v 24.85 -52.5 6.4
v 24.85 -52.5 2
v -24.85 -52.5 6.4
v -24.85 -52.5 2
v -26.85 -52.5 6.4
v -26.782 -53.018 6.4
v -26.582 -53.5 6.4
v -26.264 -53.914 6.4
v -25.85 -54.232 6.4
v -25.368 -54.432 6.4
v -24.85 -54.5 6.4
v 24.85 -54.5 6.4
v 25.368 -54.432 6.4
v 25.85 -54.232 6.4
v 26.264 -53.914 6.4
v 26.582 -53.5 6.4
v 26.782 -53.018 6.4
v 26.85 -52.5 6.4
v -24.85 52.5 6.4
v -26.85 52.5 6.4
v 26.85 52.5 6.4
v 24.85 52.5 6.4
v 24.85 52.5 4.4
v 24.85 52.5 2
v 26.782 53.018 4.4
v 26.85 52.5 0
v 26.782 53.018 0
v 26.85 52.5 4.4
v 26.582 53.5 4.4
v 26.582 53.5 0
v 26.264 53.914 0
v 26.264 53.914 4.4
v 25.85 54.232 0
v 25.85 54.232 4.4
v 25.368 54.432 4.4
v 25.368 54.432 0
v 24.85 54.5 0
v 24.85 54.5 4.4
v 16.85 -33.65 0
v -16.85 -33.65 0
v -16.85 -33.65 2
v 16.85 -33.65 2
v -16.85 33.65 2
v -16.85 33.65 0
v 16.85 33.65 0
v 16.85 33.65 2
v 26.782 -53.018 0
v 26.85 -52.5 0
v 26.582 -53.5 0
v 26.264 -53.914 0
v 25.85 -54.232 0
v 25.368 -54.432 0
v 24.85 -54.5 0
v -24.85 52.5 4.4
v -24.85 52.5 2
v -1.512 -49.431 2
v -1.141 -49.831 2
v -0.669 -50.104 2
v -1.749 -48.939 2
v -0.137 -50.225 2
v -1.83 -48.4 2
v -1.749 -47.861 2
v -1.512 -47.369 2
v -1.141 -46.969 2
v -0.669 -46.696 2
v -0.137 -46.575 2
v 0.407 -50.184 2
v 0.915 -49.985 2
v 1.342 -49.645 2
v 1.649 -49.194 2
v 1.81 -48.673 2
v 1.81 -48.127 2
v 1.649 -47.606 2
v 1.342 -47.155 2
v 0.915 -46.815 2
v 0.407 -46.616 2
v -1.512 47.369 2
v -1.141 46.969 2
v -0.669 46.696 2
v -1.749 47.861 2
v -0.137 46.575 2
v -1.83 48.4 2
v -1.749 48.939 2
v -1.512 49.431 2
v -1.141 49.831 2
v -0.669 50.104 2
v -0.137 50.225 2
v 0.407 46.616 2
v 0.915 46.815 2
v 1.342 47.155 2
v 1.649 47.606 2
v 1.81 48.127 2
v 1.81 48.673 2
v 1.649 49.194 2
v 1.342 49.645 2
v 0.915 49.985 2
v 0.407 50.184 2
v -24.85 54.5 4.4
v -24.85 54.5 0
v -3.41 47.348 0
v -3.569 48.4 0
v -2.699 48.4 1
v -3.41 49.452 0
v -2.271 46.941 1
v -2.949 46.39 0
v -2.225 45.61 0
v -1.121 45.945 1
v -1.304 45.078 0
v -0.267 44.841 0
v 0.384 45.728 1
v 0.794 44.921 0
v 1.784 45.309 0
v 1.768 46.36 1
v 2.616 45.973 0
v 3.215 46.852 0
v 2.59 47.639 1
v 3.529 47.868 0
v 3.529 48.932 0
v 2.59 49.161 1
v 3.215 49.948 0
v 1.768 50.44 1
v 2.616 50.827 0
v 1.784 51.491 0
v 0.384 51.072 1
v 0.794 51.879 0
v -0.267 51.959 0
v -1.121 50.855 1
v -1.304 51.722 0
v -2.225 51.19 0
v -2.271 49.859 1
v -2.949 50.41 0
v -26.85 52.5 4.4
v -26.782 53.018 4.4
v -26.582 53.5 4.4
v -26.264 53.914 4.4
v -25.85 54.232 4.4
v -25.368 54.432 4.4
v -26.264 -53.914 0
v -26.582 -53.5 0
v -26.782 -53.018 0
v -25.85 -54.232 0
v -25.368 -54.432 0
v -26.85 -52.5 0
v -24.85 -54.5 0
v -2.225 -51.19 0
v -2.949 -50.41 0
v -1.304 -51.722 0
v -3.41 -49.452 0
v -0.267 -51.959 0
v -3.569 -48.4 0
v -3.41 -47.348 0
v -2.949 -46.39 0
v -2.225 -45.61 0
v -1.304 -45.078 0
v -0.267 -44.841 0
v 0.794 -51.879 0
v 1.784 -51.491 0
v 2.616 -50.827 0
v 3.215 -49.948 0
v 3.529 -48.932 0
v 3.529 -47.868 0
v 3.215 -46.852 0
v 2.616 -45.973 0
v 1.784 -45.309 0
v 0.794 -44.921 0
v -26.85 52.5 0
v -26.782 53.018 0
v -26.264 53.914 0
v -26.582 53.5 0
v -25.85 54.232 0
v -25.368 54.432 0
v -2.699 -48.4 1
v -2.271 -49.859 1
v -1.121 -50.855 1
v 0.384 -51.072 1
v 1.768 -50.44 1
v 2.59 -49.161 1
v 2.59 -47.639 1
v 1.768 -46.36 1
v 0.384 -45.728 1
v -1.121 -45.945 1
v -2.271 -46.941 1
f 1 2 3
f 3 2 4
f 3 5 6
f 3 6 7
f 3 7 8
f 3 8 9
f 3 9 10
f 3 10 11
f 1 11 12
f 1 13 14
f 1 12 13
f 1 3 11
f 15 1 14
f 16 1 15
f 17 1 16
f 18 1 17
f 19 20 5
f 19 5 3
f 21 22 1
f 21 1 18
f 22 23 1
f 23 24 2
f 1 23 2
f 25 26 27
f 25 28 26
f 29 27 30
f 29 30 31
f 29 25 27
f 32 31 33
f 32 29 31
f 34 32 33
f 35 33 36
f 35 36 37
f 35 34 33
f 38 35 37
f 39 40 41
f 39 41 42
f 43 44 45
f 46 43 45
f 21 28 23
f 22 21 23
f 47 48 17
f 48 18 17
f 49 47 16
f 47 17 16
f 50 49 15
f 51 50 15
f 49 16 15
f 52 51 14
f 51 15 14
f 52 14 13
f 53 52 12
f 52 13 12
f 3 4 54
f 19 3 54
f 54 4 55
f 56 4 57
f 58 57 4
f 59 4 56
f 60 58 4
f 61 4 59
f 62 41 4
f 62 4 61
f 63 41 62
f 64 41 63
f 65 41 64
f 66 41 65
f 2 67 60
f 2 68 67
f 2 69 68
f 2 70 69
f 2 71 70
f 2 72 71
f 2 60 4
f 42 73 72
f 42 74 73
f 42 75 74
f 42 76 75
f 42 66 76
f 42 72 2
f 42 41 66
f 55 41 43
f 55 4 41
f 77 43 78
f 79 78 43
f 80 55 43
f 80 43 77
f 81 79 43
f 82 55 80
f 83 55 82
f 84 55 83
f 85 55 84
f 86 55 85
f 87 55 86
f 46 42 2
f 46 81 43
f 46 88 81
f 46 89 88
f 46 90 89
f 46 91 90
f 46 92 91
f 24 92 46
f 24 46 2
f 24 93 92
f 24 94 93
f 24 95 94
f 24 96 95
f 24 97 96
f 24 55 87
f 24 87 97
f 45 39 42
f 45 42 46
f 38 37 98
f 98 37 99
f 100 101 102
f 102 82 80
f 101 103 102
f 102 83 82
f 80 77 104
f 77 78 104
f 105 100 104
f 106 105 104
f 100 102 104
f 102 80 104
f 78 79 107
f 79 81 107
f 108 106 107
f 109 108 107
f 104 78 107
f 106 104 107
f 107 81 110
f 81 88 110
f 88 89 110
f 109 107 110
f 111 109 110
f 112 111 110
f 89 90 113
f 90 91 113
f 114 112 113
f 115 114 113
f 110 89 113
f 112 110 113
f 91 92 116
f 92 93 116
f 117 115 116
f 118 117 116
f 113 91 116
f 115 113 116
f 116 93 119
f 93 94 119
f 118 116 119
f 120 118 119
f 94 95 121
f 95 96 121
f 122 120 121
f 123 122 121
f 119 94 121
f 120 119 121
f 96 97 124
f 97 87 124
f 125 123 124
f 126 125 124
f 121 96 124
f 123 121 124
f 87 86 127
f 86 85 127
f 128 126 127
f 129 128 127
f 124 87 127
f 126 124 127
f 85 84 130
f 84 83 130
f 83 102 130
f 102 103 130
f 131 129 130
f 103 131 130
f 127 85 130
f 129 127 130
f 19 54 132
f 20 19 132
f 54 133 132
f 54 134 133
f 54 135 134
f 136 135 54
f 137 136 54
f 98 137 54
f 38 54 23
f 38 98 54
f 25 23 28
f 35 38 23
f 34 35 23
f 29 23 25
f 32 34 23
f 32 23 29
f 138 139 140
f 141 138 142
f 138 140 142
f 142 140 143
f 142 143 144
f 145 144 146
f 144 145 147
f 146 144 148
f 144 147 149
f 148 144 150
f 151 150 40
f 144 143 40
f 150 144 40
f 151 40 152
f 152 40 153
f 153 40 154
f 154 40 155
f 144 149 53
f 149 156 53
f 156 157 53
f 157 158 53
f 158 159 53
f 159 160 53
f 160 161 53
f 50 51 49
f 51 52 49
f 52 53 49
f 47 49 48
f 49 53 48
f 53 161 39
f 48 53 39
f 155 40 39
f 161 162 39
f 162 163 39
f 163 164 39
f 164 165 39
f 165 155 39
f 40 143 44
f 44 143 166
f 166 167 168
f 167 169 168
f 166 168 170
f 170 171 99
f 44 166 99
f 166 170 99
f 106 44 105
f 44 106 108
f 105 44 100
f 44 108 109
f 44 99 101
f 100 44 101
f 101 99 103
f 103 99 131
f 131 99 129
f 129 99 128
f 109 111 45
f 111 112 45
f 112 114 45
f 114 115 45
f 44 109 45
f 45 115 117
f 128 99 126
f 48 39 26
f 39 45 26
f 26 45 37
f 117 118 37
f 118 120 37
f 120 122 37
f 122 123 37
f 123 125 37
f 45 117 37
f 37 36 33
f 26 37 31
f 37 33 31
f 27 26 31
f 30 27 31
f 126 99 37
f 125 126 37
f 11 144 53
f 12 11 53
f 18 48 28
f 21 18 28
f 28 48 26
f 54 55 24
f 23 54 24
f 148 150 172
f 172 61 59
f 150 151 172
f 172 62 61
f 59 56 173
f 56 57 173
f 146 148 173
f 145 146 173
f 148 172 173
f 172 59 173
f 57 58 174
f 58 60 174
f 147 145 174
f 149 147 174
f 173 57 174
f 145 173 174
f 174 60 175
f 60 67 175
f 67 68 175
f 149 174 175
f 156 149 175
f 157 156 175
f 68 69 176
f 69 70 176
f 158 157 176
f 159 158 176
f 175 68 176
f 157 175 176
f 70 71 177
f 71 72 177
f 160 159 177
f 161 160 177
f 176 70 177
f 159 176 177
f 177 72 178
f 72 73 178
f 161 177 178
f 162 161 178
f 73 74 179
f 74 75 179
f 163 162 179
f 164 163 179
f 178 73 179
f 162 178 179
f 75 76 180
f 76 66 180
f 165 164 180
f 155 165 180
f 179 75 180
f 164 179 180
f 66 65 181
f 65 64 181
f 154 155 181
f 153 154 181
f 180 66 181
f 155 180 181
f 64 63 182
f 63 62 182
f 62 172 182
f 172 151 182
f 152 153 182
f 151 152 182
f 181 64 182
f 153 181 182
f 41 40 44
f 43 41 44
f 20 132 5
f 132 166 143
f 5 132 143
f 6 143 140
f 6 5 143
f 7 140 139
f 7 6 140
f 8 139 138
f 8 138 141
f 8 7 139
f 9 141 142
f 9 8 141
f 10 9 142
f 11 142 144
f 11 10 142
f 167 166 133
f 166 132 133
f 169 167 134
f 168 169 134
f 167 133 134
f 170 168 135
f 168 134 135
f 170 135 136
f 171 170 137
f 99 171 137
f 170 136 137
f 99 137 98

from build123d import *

# Parameters (mm, degrees)
F0_W           = 49.7
F0_H           = 105
F0_W_2         = 33.7
F0_H_2         = 67.3
F1_DEPTH       = 2
F2_DEPTH       = 6.4
F3_DEPTH       = 4.4
F4_D           = 3.4544
F4_CSINK_D     = 7.1374
F4_CSINK_ANGLE = 82
F5_R           = 2


with BuildPart() as f1:
    # F0 (on Top) → F1 (new body)
    with BuildSketch(Plane.XY):
        Rectangle(F0_W, F0_H)
        Rectangle(F0_W_2, F0_H_2, mode=Mode.SUBTRACT)
    extrude(amount=F1_DEPTH)

    # F0 (on Top) → F2 (join)
    with BuildSketch(Plane.XY):
        Polygon((26.85, 52.5), (24.85, 52.5), (24.85, -52.5), (-24.85, -52.5), (-24.85, 52.5), (-26.85, 52.5), (-26.85, -54.5), (26.85, -54.5), align=None)
    extrude(amount=F2_DEPTH)

    # F0 (on Top) → F3 (join)
    with BuildSketch(Plane.XY):
        Polygon((-24.85, 52.5), (24.85, 52.5), (26.85, 52.5), (26.85, 54.5), (-26.85, 54.5), (-26.85, 52.5), align=None)
    extrude(amount=F3_DEPTH)

    # F4 (through all)
    with Locations(Plane(origin=(0, 0, 0), x_dir=(1, 0, 0), z_dir=(0, 0, -1))):
        with Locations((0, -48.4), (0, 48.4)):
            CounterSinkHole(F4_D / 2, F4_CSINK_D / 2, counter_sink_angle=F4_CSINK_ANGLE)

    # F5
    f5_edges = [f1.edges().sort_by_distance(p)[0] for p in [
        (26.85, 54.5, 2.2),
        (26.85, -54.5, 3.2),
        (-26.85, -54.5, 3.2),
        (-26.85, 54.5, 2.2),
    ]]
    fillet(f5_edges, radius=F5_R)


solid = f1.part
